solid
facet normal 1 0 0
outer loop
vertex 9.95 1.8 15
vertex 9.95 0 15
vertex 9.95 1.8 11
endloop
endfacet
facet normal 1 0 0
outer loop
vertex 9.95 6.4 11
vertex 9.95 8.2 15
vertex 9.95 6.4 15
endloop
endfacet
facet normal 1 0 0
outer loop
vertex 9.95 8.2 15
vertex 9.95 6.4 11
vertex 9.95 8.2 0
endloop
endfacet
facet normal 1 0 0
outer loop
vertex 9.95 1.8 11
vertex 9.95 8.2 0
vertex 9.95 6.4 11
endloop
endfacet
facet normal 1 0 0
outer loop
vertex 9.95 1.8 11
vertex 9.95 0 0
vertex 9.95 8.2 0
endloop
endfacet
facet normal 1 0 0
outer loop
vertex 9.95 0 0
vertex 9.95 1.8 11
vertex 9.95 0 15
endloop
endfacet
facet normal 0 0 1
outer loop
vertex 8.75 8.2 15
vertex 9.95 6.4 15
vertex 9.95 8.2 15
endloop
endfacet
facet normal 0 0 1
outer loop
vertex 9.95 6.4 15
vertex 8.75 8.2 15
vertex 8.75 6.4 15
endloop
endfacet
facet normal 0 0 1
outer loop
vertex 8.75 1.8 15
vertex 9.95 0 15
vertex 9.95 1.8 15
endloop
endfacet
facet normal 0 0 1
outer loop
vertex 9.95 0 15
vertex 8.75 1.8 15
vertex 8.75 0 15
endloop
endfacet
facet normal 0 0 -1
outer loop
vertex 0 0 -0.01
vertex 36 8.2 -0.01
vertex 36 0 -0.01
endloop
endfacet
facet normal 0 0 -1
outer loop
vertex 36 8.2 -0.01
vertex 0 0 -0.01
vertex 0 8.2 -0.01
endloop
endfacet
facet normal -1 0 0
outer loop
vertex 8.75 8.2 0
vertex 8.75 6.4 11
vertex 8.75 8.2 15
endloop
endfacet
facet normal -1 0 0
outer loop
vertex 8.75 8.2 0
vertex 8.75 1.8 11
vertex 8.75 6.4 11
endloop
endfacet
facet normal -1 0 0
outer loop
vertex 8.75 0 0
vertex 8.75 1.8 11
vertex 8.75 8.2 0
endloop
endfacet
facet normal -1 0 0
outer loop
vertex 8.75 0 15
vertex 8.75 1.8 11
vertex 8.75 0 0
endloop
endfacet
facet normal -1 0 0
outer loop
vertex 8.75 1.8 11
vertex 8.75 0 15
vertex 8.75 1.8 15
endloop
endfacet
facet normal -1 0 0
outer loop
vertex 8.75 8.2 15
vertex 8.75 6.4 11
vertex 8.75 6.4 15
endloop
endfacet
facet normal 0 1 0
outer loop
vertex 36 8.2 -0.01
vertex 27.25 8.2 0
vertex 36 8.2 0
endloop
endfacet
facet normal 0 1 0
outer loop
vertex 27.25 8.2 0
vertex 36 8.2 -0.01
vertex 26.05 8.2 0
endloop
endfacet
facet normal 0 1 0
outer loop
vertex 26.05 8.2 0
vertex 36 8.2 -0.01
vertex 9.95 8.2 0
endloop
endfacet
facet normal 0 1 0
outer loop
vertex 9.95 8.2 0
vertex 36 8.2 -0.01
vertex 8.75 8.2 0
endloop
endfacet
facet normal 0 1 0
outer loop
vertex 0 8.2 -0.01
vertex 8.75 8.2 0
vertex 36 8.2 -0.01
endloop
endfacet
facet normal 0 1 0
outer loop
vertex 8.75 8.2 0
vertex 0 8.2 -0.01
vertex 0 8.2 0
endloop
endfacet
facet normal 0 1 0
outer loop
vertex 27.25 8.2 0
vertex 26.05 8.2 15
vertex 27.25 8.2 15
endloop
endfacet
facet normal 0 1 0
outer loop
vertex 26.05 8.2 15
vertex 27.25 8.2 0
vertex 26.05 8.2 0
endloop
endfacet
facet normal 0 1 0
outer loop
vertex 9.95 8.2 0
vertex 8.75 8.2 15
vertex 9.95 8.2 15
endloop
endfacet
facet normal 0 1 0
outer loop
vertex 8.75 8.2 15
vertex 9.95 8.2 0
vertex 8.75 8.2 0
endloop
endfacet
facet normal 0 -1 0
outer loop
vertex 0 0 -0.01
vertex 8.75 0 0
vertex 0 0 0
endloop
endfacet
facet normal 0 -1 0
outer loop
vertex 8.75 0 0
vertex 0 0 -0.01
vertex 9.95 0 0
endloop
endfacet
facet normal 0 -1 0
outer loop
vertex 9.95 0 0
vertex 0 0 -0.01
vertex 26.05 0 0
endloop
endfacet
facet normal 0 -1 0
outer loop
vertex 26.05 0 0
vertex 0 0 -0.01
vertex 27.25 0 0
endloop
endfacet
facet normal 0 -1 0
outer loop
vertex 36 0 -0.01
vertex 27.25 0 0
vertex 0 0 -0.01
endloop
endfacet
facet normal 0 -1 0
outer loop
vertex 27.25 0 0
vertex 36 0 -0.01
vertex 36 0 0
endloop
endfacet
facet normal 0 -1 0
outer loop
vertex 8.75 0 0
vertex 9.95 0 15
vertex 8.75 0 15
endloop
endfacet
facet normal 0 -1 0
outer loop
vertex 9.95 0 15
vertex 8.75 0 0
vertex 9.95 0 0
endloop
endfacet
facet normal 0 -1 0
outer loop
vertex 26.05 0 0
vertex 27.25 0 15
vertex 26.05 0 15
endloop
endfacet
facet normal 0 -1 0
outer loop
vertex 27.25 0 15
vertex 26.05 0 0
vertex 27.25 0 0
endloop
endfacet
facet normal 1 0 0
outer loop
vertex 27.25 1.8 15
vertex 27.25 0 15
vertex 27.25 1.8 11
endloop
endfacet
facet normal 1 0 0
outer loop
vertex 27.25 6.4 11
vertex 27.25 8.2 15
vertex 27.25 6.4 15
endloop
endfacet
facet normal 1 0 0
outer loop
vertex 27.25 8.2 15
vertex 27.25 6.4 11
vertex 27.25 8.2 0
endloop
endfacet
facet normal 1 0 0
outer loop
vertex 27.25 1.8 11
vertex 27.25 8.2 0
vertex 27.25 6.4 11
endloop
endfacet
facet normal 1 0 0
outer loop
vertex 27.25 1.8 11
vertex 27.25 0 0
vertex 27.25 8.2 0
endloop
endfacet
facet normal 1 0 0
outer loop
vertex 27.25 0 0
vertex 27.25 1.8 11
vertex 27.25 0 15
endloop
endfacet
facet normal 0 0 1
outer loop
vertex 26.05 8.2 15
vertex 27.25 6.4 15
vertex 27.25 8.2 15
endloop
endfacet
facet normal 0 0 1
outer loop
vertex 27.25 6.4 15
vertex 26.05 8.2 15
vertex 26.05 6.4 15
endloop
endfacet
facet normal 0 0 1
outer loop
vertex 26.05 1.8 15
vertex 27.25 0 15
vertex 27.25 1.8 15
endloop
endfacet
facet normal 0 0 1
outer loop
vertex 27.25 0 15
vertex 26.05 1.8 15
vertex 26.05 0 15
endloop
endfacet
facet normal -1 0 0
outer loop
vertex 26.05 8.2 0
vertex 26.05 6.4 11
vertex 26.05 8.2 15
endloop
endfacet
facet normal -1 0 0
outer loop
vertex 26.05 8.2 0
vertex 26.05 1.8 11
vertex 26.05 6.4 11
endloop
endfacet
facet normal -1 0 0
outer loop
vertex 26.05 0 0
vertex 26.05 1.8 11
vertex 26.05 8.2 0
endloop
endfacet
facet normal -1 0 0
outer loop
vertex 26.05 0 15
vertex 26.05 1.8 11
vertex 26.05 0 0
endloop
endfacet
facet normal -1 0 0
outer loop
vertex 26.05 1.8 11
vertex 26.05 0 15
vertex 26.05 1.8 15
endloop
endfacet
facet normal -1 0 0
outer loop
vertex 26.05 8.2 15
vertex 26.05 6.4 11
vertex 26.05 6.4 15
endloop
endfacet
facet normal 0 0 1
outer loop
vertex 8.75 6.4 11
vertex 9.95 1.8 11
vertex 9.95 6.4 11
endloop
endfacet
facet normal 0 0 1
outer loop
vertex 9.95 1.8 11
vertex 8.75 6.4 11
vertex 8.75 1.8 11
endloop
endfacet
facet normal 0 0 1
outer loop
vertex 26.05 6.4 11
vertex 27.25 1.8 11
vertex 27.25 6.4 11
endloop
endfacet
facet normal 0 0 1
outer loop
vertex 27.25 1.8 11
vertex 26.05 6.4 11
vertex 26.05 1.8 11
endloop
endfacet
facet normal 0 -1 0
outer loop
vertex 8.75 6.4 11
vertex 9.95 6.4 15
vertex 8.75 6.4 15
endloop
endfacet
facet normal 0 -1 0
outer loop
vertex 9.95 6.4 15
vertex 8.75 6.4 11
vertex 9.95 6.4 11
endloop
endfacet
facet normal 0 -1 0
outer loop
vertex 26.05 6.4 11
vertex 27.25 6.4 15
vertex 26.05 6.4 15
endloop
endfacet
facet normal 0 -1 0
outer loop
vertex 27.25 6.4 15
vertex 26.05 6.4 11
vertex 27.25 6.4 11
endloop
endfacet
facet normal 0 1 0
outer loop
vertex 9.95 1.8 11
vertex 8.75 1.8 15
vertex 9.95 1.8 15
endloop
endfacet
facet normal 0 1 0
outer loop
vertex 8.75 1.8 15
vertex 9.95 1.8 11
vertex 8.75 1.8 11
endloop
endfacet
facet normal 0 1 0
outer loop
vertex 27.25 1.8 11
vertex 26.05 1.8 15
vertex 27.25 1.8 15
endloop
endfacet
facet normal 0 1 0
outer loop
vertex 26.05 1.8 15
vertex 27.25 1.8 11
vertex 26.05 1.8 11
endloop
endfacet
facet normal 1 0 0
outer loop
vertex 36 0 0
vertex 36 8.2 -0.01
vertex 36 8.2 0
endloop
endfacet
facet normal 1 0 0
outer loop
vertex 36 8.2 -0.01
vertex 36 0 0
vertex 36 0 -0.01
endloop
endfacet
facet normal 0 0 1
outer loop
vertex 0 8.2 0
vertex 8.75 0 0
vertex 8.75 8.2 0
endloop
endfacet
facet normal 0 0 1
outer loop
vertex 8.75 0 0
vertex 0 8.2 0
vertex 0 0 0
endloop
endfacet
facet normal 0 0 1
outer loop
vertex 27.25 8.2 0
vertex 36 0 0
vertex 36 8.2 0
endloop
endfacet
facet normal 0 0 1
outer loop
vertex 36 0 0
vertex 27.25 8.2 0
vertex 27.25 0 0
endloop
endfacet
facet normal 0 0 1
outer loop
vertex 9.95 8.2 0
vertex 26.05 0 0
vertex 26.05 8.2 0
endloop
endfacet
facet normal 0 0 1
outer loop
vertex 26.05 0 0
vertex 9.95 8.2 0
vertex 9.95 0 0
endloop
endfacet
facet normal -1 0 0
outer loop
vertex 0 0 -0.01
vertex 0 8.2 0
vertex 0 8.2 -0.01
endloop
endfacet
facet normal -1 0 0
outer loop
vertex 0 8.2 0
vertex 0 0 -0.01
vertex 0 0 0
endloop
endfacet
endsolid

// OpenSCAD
// file: ../Base/Helper.scad
// Fischertechnik Box Foundation
// Helper functions

include <PlacementOptions.scad>

// getRotation(rotations, i)
// gets the rotation with index i, even if rotations or rotations[i] is undefined.
// If undefined, NoRotation ist returned.
// rotations = list of Rotate-constants
// i = Index of the rotation
function getRotation(rotations, i) = (is_undef(rotations) || is_undef(rotations[i])) ? NoRotation : rotations[i];
// file: ../Base/Boxes.scad
// Fischertechnik Box Foundation
// Pre-designed Boxes

use <Constants.scad>

include <PlacementOptions.scad>

box190Width = 190;
box190Depth = 130;
box130Width = 130;
box130Depth = 95;

// Values are from an original ec3 box
topBottomDifference = 1.5;
outerHeight = 40;
innerHeight = 38.2;
baseThickness = outerHeight - innerHeight;
stackExcess = 5.7;
radius = 3.5;
wallThickness = 1.5;
tolerance = 0.2;
stackOffset = innerHeight - stackExcess;

boxUsageHeight = stackOffset;
boxWallThickness = wallThickness;
boxBaseThickness = baseThickness;
boxWebWidth = 3.0;

// getBoxWallThickness()
// Gets the wall thickness of a Fischertechnik Box
function getBoxWallThickness() = boxWallThickness;

// getBoxUsageHeight()
// Gets the usable height of a Fischertechnik box
function getBoxUsageHeight() = boxUsageHeight;

// getBoxInnerHeight()
// Gets the inner height of a Fischertechnik box, including the stack excess
function getBoxInnerHeight() = innerHeight;

// getBoxBaseThickness()
// Gets the thickness of the Fischertechnik box base.
function getBoxBaseThickness() = boxBaseThickness;

// getBoxWebWidth()
// Gets the width of a box web
function getBoxWebWidth() = boxWebWidth;

// getBox190Space()
// Gets the usable inner space of a Box 190 as an x/y-list
function getBox190Space() = [
    box190Width - 2*getBoxWallThickness() - topBottomDifference, 
    box190Depth - 2*getBoxWallThickness() - topBottomDifference ];

// RoundedCornerPlate(width, depth, height, radius)
// Creates a body plate with rounded corners for a box. Used
// also to create the complete box with the hull module.
// width = Width of the plate
// depth = depth of the plate 
// height = thickness of the plate
// radius = radius of the rounded corner
module RoundedCornerPlate(width, depth, height, radius) {
    translate([radius, radius])
    hull() {
        w = width-2*radius;
        d = depth-2*radius;
        cube([w, d, height]);
        cylinder(height, r=radius, $fn=getFragments());
        translate([w, 0])
            cylinder(height, r=radius, $fn=getFragments());
        translate([w, d])
            cylinder(height, r=radius, $fn=getFragments());
        translate([0, d])
            cylinder(height, r=radius, $fn=getFragments());
    }
}

// BoxBase(width, depth)
// Creates an empty stackable Fischertechnik compatible box
// width = Outer width of the box (190, 130, ...)
// depth = Outer depth of the box (130, 95, ...)

module BoxBase(width, depth, height=outerHeight) {    
    thinPlate = 0.01;

    innerHeight = height - baseThickness;    
    
    module Body(tolerance=tolerance) {
        hull() {
            // Bottom with tolerance to fit into the original boxes when stacked
            translate([-wallThickness+tolerance, -wallThickness+tolerance, -baseThickness])
                RoundedCornerPlate(width-topBottomDifference-2*tolerance, depth-topBottomDifference-2*tolerance, thinPlate, radius);
            
            // Top
            translate([-wallThickness-topBottomDifference/2, -wallThickness-topBottomDifference/2, innerHeight-thinPlate])
                RoundedCornerPlate(width, depth, thinPlate, radius);
         }
    }

    module Cutoff() {
        hull() {
            coWidth = width - 2*wallThickness;
            coDepth = depth - 2*wallThickness;
            
            // Bottom
            RoundedCornerPlate(coWidth-topBottomDifference, coDepth-topBottomDifference, thinPlate, radius);

            // Top
            translate([-topBottomDifference/2, -topBottomDifference/2, innerHeight+thinPlate]) 
                RoundedCornerPlate(coWidth, coDepth, thinPlate, radius);
        }
    }
    
    difference() {        
        Body();
        Cutoff();
        stackOffset = innerHeight - stackExcess;
        translate([0, 0, stackOffset + baseThickness])
            Body(tolerance=0);
    }
}

// Creates the Fischertechnik empty box 130x190 mm and places it at position 0,0
// 190x130 are the outer sizes, the inner space is slightly smaller. Use getBox190Space() to get the inner sizes.
// The box is positioned that the usable inner space is at the 0,0,0 position.

module Box190() {
    BoxBase(box190Width, box190Depth);
}

// Gets the usable inner space of a Box 130 as an x/y-list
function getBox130Space() = [
    box130Width - 2*getBoxWallThickness() - topBottomDifference, 
    box130Depth - 2*getBoxWallThickness() - topBottomDifference ];

// Creates the Fischertechnik empty box 95x130 mm and places it at position 0,0
// 190x130 are the outer sizes, the inner space is slightly smaller. Use getBox190Space() to get the inner sizes.
// The box is positioned that the usable inner space is at the 0,0,0 position.

module Box130() {
    BoxBase(box130Width, box130Depth);
}

// Creates a web at the specified box walls
// corner 0 = LowerLeft, 1 = UpperLeft, 2 = UpperRight, 3 = LowerRight
// side 0 = LeftOfCorner, 1 = RightOfCorner
// distance = Distance in mm from the corner
// boxSpace = inner width and depth of the box (default: Box 190)
// webWidth = length of the web (default is 3 mms)
// webThickness = thickness of the web (default is 1 mm)

module BoxWeb(corner, side, distance, boxSpace=getBox190Space(), webWidth=getBoxWebWidth(), webThickness=1.0) {
    sink = getBoxWallThickness()/2;

    width = (corner % 2 == 0) ? 
            (side == LeftOfCorner ? webWidth : webThickness) :
            (side == LeftOfCorner ? webThickness : webWidth);

    depth = (corner % 2 == 0) ? 
            (side == RightOfCorner ? webWidth : webThickness) :
            (side == RightOfCorner ? webThickness : webWidth);
    
    xDiff = corner == LowerLeft ? 
                (side == LeftOfCorner ? -sink : distance) :
            (corner == UpperLeft ?                
                (side == LeftOfCorner ? distance : -sink) :
            (corner == UpperRight ?
                (side == LeftOfCorner ? boxSpace.x-webWidth+sink : boxSpace.x-distance-webThickness) :
                (side == LeftOfCorner ? boxSpace.x-distance-webThickness: boxSpace.x-webWidth+sink)));

    yDiff = corner == LowerLeft ? 
                (side == RightOfCorner ? -sink : distance) :
            (corner == UpperLeft ?
                (side == RightOfCorner ? boxSpace.y-distance-webThickness : boxSpace.y-webWidth+sink) :
            (corner == UpperRight ?
                (side == RightOfCorner ? boxSpace.y-webWidth+sink : boxSpace.y-distance-webThickness) :
                (side == RightOfCorner ? distance : -sink)));
    
    translate([xDiff, yDiff, -getExcess()])
        cube([width, depth, boxUsageHeight + 2*getExcess()]);
}
// file: ../Base/Rotation.scad
// Fischertechnik Box Foundation
// Geometry Helpers Rotation

include <PlacementOptions.scad>

// getRotatedSpace(space, rotation=NoRotation)
// Rotates the space dependent on the specified rotation

function getRotatedSpace(space, rotation=NoRotation) = [
    (rotation == Rotate90 || rotation == Rotate270) ? space.y : space.x,
    (rotation == Rotate90 || rotation == Rotate270) ? space.x : space.y
];

// Rotates the given space around the fixed left lower corner
// space = the space the children needs as width/depth list [width,depth]
// rotation = 0 Rotate0 degrees, 1 Rotate90 degrees, 2 Rotate180 degrees, 3 Rotate270 degrees (equivalent to -90)

module RotateFix(space, rotation=NoRotation) {
    dy = (rotation == Rotate0 || rotation == Rotate270) ? 0 :
        (rotation == Rotate90) ? space.x :
        space.y;
    dx = (rotation < Rotate180) ? 0 :
        (rotation == Rotate180) ? space.x :
        space.y;
    
    translate([dx, dy, 0])
        rotate([0, 0, rotations[rotation]])
            children();
}
// file: ../Base/Alignment.scad
// Fischertechnik Box Foundation
// Geometry Helpers Alignment

include <PlacementOptions.scad>

// getAlignedX(elementWidth, spaceWidth, align=AlignRight, offset=0)
// Gets the aligned X offset of an element with the given
// width in the given space.
// elementWidth = The width of the element to positon
// spaceWidth = The space where the element should be aligned
// align = 0 AlignLeft, 1 AlignCenter, 2 AlignRight
// offset = an optional offset from the aligned position. When
// aligned left or centered, then positive values are in X direction.
// When aligned right then positive values are in negative X direction.

function getAlignedX(elementWidth, spaceWidth, align=AlignRight, offset=0) =
    (align == AlignLeft) ?
        offset :
        ((align == AlignCenter) ?
        (spaceWidth - elementWidth)/2 + offset :
        spaceWidth - offset - elementWidth);

// getAlignedY(elementDepth, spaceDepth, align=AlignTop, offset=0)
// Gets the aligned Y offset of an element with the given
// depth in the given space.
// elementDepth = The depth of the element to positon
// spaceDepth = The space where the element should be aligned
// align = 0 AlignBottom, 1 AlignCenter, 2 AlignTop
// offset = an optional offset from the aligned position. When
// aligned bottom or centered, then positive values are in Y direction.
// When aligned top then positive values are in negative Y direction.

function getAlignedY(elementDepth, spaceDepth, align=AlignTop, offset=0) =
    (align == AlignBottom) ?
        offset :
        ((align == AlignCenter) ?
        (spaceDepth - elementDepth)/2 + offset :
        spaceDepth - offset - elementDepth);
// file: ../Base/PlacementOptions.scad
// Fischertechnik Box Foundation
// Placement Options

// Alignment
NoAlign = 0;
AlignLeft = 1;
AlignBottom = 2;
AlignCenter = 3;
AlignRight = 4;
AlignTop = 5;

// Element rotation degree steps
rotations = [0, -90, -180, -270];

// Rotation
NoRotation = 0;
Rotate0 = 0;
Rotate90 = 1;
Rotate180 = 2;
Rotate270 = 3;

// Docking (seen from above)
NoDock = -1;
DockLeft = 0;
DockTop = 1;
DockRight = 2;
DockCorner = 2;
DockBottom = 3;

// Web corners
LowerLeft = 0;
UpperLeft = 1;
UpperRight = 2;
LowerRight = 3;

// Web position relative to corner
LeftOfCorner = 0;
RightOfCorner = 1;
// file: ../Base/Placement.scad
// Fischertechnik Box Foundation
// Geometry Helpers Placement

use <Constants.scad>
use <Alignment.scad>
use <Rotation.scad>
use <Boxes.scad>

include <PlacementOptions.scad>

// Place(x=0, y=0, elementSpace=[0,0], alignX=AlignLeft, alignY=AlignBottom, rotation=Rotate0, boxSpace=getBox190Space())
// Places the child at the specified position
// y = Y-Position. This is a relative position when an X aligment is specified.
// x = X-Position. This is a relative position when an Y aligment is specified.
// elementSpace = space of the element to be placed [x,y]
// alignX = -1=NoAlign, 0 AlignLeft, 1 AlignCenter, 3 AlignRight (elementSpace and boxSpace required!)
// alignY = -1=NoAlign, 2 AlignBottom, 1 AlignCenter, 4 AlignTop (elementSpace and boxSpace required!)
// rotation = 0 Rotate0 0 degrees, 1 Rotate90 90 degrees, 
// 2 Rotate180 180 degrees, 3 Rotate270 270 degrees (equivalent to -90)
// boxSpace = Inner space of the box where the placement occurs [x,y] - default is Box 190x130 inner space

module Place(x=0, y=0, elementSpace=[0,0], 
  alignX=AlignLeft, alignY=AlignBottom, 
  rotation=NoRotation, boxSpace=getBox190Space()) {

    module Position(x, y, space, rotation=Rotate0) {
        translate([x, y, 0])
            RotateFix(space, rotation)
                children();
    }

    space = getRotatedSpace(elementSpace, rotation);
    alignedX = getAlignedX(space.x, boxSpace.x, alignX, x);
    alignedY = getAlignedY(space.y, boxSpace.y, alignY, y);
    Position(alignedX, alignedY, elementSpace, rotation)
        children();
}

// Center(space=getBox130Space(), elementSpace=[0,0])
// space = Space where the children is centered. For cylinder use centered=true and no elementSpace.
// elementSpace = space of the element to be centered [x,y]

module Center(space=getBox190Space(), elementSpace=[0,0]) {
    Place(elementSpace=elementSpace, boxSpace=space, alignX=AlignCenter, alignY=AlignCenter)
        children();
}

// CenterHorizontal(width=0, y=0, offset=0, space=getBox130Space())
// width = Width of the element to be placed.
// y = Y position of the element
// offset = Offset from the center position (negative will be left of the center)
// space = Space where the element is placed

module CenterHorizontal(width=0, y=0, offset=0, space=getBox190Space()) {
    Place(x=offset, y=y, elementSpace=[width, 0], boxSpace=space, alignX=AlignCenter)
        children(0);
}

// CenterVertical(depth=0, x=0, offset=0, space=getBox130Space())
// depth = Depth of the element to be placed.
// x = X position of the element
// offset = Offset from the center position (negative will be down of the center)
// space = Space where the element is placed

module CenterVertical(depth=0, x=0, offset=0, space=getBox190Space()) {
    Place(x=x, y=offset, elementSpace=[0, depth], boxSpace=space, alignY=AlignCenter)
        children(0);
}

// getIsVertical(align)
// True if the specified alignment needs a vertical orientation for a divider (AlignRight, AlignLeft)

function getIsVertical(align) = (align == AlignRight || align == AlignLeft);

// getIsHorizontal(align)
// True if the specified alignment needs a horizontal orientation for a divider (AlignTop, AlignBottom)

function getIsHorizontal(align) = (align == AlignTop || align == AlignBottom);
// file: ../Base/Constants.scad
// Fischertechnik Box Foundation
// Constants

// Constant values necessary for multiple elements

// Base constants
dividerThickness = 1.2;
excess = 0.01;
fragments = 90;
tolerance = 0.8;

// Gets the thickness of a divider 
function getDividerThickness() = dividerThickness;

// Gets the excess that is used to merge walls into each other
function getExcess() = excess;

// Gets amount of fragments of a cylinder
function getFragments() = fragments;

// Gets the inner tolerance of a frame to each side
function getTolerance() = tolerance;


// Fischertechnik specific constants
axisDiameter = 4;
axisBottomDiameter = axisDiameter + 1;
axisTolerance = 0.2;

// Gets axis diameter of Fischertechnik axis
function getAxisDiameter() = axisDiameter;

// Gets axis diameter tolerance (subtracted for element axis)
function getAxisTolerance() = axisTolerance;

// Gets the axis diameter for standing axis
function getStandAxisDiameter() = getAxisDiameter() - getAxisTolerance();

// Gets axis bottom diameter for thicker part at the bottom
function getAxisBottomDiameter() = axisBottomDiameter;

standardEdgeDistance = 2.5;
standardWebDistance = 11.5;
standardCornerLength = 15;

// gets the standard distance to the wall of the box for dockable frames with webs
function getStandardEdgeDistance() = standardEdgeDistance;

// gets the standard distance of each web to the corner of the dockable frame
function getStandardWebDistance() = standardWebDistance;

// gets the standard length of the corner walls of a dockable frame
function getStandardCornerLength() = standardCornerLength;

tubeWallFactor = 0.8;

// gets the wall thickness of a tube.
function getTubeWallThickness() = tubeWallFactor * getDividerThickness();

smallPartsFrameHeight = 20;

// gets the frame height for docked small parts boxes.
function getSmallPartsFrameHeight() = smallPartsFrameHeight;

hubRingDiameter = 19.5;
hubRingLevelDiameter = 21;

// gets the diameter of a tube matching the inner ring of a wheel
function getHubRingDiameter() = hubRingDiameter;

// gets the diameter of a hub tube with a thicker diameter
function getHubRingLevelDiameter() = hubRingLevelDiameter;
// main file
// Fischertechnik Box Library
// Holder for Spring Leg
// 31307

use <../Base/Constants.scad>
use <../Base/Placement.scad>
use <../Base/Deployment.scad>
use <../ModelBase/Simple.scad>
use <../ModelBase/Complex.scad>

include <../Base/PlacementOptions.scad>

/* [Element Parameters] */
count = 1;
dock = false;

/* [Hidden] */
width = 36;
depth = 8.2;

innerWidth = 18.5;

// getHolderSpringLegSpace(count=1)
// Gets the space the Spring Leg holders need.
// count = Count of spring legs

function getHolderSpringLegSpace(count=1) = [width, depth * count];

// HolderSpringLeg(count=1, dock=false)
// Creates Spring Leg holders.
// count = Count of spring legs
// dock = true for extended holder walls into the bottom wall of the box. Rotate when placing if necessary.

module HolderSpringLeg(count=1, dock=false) {
    Space(getHolderSpringLegSpace(count));

    wallSpace = [innerWidth, depth];
    cutoffDepth = getAxisDiameter() + 0.6;
    holderDepth = depth + getExcess();
    wallVolume = [getDividerThickness(), depth, getFrameAxisHeight()];

    module Holders() {
        difference() {
            CenterHorizontal(innerWidth, space=getHolderSpringLegSpace(count))
                DeploySame(wallSpace, wallVolume)
                    Wall(wallVolume);
            cutoffVolume = [width, cutoffDepth, getAxisDiameter() + getExcess()];
            translate([0,0,getFrameAxisHeight() - getAxisDiameter()])
            CenterVertical(cutoffDepth, space=wallVolume)    
                cube(cutoffVolume);

        }
    }

    for(y = [0 : depth : (count-1) * depth])
        translate([0, y])
            Holders();

    if (dock) {
        dockVolume = [getDividerThickness(), getDividerThickness() + getExcess(), getFrameAxisHeight()];
        translate([0, -getDividerThickness()])
            CenterHorizontal(innerWidth, space=getHolderSpringLegSpace(count))
                DeploySame(wallSpace, dockVolume)
                    Wall(dockVolume);
    }    
}

// Test
color("lightgray")
HolderSpringLeg(count, dock);
